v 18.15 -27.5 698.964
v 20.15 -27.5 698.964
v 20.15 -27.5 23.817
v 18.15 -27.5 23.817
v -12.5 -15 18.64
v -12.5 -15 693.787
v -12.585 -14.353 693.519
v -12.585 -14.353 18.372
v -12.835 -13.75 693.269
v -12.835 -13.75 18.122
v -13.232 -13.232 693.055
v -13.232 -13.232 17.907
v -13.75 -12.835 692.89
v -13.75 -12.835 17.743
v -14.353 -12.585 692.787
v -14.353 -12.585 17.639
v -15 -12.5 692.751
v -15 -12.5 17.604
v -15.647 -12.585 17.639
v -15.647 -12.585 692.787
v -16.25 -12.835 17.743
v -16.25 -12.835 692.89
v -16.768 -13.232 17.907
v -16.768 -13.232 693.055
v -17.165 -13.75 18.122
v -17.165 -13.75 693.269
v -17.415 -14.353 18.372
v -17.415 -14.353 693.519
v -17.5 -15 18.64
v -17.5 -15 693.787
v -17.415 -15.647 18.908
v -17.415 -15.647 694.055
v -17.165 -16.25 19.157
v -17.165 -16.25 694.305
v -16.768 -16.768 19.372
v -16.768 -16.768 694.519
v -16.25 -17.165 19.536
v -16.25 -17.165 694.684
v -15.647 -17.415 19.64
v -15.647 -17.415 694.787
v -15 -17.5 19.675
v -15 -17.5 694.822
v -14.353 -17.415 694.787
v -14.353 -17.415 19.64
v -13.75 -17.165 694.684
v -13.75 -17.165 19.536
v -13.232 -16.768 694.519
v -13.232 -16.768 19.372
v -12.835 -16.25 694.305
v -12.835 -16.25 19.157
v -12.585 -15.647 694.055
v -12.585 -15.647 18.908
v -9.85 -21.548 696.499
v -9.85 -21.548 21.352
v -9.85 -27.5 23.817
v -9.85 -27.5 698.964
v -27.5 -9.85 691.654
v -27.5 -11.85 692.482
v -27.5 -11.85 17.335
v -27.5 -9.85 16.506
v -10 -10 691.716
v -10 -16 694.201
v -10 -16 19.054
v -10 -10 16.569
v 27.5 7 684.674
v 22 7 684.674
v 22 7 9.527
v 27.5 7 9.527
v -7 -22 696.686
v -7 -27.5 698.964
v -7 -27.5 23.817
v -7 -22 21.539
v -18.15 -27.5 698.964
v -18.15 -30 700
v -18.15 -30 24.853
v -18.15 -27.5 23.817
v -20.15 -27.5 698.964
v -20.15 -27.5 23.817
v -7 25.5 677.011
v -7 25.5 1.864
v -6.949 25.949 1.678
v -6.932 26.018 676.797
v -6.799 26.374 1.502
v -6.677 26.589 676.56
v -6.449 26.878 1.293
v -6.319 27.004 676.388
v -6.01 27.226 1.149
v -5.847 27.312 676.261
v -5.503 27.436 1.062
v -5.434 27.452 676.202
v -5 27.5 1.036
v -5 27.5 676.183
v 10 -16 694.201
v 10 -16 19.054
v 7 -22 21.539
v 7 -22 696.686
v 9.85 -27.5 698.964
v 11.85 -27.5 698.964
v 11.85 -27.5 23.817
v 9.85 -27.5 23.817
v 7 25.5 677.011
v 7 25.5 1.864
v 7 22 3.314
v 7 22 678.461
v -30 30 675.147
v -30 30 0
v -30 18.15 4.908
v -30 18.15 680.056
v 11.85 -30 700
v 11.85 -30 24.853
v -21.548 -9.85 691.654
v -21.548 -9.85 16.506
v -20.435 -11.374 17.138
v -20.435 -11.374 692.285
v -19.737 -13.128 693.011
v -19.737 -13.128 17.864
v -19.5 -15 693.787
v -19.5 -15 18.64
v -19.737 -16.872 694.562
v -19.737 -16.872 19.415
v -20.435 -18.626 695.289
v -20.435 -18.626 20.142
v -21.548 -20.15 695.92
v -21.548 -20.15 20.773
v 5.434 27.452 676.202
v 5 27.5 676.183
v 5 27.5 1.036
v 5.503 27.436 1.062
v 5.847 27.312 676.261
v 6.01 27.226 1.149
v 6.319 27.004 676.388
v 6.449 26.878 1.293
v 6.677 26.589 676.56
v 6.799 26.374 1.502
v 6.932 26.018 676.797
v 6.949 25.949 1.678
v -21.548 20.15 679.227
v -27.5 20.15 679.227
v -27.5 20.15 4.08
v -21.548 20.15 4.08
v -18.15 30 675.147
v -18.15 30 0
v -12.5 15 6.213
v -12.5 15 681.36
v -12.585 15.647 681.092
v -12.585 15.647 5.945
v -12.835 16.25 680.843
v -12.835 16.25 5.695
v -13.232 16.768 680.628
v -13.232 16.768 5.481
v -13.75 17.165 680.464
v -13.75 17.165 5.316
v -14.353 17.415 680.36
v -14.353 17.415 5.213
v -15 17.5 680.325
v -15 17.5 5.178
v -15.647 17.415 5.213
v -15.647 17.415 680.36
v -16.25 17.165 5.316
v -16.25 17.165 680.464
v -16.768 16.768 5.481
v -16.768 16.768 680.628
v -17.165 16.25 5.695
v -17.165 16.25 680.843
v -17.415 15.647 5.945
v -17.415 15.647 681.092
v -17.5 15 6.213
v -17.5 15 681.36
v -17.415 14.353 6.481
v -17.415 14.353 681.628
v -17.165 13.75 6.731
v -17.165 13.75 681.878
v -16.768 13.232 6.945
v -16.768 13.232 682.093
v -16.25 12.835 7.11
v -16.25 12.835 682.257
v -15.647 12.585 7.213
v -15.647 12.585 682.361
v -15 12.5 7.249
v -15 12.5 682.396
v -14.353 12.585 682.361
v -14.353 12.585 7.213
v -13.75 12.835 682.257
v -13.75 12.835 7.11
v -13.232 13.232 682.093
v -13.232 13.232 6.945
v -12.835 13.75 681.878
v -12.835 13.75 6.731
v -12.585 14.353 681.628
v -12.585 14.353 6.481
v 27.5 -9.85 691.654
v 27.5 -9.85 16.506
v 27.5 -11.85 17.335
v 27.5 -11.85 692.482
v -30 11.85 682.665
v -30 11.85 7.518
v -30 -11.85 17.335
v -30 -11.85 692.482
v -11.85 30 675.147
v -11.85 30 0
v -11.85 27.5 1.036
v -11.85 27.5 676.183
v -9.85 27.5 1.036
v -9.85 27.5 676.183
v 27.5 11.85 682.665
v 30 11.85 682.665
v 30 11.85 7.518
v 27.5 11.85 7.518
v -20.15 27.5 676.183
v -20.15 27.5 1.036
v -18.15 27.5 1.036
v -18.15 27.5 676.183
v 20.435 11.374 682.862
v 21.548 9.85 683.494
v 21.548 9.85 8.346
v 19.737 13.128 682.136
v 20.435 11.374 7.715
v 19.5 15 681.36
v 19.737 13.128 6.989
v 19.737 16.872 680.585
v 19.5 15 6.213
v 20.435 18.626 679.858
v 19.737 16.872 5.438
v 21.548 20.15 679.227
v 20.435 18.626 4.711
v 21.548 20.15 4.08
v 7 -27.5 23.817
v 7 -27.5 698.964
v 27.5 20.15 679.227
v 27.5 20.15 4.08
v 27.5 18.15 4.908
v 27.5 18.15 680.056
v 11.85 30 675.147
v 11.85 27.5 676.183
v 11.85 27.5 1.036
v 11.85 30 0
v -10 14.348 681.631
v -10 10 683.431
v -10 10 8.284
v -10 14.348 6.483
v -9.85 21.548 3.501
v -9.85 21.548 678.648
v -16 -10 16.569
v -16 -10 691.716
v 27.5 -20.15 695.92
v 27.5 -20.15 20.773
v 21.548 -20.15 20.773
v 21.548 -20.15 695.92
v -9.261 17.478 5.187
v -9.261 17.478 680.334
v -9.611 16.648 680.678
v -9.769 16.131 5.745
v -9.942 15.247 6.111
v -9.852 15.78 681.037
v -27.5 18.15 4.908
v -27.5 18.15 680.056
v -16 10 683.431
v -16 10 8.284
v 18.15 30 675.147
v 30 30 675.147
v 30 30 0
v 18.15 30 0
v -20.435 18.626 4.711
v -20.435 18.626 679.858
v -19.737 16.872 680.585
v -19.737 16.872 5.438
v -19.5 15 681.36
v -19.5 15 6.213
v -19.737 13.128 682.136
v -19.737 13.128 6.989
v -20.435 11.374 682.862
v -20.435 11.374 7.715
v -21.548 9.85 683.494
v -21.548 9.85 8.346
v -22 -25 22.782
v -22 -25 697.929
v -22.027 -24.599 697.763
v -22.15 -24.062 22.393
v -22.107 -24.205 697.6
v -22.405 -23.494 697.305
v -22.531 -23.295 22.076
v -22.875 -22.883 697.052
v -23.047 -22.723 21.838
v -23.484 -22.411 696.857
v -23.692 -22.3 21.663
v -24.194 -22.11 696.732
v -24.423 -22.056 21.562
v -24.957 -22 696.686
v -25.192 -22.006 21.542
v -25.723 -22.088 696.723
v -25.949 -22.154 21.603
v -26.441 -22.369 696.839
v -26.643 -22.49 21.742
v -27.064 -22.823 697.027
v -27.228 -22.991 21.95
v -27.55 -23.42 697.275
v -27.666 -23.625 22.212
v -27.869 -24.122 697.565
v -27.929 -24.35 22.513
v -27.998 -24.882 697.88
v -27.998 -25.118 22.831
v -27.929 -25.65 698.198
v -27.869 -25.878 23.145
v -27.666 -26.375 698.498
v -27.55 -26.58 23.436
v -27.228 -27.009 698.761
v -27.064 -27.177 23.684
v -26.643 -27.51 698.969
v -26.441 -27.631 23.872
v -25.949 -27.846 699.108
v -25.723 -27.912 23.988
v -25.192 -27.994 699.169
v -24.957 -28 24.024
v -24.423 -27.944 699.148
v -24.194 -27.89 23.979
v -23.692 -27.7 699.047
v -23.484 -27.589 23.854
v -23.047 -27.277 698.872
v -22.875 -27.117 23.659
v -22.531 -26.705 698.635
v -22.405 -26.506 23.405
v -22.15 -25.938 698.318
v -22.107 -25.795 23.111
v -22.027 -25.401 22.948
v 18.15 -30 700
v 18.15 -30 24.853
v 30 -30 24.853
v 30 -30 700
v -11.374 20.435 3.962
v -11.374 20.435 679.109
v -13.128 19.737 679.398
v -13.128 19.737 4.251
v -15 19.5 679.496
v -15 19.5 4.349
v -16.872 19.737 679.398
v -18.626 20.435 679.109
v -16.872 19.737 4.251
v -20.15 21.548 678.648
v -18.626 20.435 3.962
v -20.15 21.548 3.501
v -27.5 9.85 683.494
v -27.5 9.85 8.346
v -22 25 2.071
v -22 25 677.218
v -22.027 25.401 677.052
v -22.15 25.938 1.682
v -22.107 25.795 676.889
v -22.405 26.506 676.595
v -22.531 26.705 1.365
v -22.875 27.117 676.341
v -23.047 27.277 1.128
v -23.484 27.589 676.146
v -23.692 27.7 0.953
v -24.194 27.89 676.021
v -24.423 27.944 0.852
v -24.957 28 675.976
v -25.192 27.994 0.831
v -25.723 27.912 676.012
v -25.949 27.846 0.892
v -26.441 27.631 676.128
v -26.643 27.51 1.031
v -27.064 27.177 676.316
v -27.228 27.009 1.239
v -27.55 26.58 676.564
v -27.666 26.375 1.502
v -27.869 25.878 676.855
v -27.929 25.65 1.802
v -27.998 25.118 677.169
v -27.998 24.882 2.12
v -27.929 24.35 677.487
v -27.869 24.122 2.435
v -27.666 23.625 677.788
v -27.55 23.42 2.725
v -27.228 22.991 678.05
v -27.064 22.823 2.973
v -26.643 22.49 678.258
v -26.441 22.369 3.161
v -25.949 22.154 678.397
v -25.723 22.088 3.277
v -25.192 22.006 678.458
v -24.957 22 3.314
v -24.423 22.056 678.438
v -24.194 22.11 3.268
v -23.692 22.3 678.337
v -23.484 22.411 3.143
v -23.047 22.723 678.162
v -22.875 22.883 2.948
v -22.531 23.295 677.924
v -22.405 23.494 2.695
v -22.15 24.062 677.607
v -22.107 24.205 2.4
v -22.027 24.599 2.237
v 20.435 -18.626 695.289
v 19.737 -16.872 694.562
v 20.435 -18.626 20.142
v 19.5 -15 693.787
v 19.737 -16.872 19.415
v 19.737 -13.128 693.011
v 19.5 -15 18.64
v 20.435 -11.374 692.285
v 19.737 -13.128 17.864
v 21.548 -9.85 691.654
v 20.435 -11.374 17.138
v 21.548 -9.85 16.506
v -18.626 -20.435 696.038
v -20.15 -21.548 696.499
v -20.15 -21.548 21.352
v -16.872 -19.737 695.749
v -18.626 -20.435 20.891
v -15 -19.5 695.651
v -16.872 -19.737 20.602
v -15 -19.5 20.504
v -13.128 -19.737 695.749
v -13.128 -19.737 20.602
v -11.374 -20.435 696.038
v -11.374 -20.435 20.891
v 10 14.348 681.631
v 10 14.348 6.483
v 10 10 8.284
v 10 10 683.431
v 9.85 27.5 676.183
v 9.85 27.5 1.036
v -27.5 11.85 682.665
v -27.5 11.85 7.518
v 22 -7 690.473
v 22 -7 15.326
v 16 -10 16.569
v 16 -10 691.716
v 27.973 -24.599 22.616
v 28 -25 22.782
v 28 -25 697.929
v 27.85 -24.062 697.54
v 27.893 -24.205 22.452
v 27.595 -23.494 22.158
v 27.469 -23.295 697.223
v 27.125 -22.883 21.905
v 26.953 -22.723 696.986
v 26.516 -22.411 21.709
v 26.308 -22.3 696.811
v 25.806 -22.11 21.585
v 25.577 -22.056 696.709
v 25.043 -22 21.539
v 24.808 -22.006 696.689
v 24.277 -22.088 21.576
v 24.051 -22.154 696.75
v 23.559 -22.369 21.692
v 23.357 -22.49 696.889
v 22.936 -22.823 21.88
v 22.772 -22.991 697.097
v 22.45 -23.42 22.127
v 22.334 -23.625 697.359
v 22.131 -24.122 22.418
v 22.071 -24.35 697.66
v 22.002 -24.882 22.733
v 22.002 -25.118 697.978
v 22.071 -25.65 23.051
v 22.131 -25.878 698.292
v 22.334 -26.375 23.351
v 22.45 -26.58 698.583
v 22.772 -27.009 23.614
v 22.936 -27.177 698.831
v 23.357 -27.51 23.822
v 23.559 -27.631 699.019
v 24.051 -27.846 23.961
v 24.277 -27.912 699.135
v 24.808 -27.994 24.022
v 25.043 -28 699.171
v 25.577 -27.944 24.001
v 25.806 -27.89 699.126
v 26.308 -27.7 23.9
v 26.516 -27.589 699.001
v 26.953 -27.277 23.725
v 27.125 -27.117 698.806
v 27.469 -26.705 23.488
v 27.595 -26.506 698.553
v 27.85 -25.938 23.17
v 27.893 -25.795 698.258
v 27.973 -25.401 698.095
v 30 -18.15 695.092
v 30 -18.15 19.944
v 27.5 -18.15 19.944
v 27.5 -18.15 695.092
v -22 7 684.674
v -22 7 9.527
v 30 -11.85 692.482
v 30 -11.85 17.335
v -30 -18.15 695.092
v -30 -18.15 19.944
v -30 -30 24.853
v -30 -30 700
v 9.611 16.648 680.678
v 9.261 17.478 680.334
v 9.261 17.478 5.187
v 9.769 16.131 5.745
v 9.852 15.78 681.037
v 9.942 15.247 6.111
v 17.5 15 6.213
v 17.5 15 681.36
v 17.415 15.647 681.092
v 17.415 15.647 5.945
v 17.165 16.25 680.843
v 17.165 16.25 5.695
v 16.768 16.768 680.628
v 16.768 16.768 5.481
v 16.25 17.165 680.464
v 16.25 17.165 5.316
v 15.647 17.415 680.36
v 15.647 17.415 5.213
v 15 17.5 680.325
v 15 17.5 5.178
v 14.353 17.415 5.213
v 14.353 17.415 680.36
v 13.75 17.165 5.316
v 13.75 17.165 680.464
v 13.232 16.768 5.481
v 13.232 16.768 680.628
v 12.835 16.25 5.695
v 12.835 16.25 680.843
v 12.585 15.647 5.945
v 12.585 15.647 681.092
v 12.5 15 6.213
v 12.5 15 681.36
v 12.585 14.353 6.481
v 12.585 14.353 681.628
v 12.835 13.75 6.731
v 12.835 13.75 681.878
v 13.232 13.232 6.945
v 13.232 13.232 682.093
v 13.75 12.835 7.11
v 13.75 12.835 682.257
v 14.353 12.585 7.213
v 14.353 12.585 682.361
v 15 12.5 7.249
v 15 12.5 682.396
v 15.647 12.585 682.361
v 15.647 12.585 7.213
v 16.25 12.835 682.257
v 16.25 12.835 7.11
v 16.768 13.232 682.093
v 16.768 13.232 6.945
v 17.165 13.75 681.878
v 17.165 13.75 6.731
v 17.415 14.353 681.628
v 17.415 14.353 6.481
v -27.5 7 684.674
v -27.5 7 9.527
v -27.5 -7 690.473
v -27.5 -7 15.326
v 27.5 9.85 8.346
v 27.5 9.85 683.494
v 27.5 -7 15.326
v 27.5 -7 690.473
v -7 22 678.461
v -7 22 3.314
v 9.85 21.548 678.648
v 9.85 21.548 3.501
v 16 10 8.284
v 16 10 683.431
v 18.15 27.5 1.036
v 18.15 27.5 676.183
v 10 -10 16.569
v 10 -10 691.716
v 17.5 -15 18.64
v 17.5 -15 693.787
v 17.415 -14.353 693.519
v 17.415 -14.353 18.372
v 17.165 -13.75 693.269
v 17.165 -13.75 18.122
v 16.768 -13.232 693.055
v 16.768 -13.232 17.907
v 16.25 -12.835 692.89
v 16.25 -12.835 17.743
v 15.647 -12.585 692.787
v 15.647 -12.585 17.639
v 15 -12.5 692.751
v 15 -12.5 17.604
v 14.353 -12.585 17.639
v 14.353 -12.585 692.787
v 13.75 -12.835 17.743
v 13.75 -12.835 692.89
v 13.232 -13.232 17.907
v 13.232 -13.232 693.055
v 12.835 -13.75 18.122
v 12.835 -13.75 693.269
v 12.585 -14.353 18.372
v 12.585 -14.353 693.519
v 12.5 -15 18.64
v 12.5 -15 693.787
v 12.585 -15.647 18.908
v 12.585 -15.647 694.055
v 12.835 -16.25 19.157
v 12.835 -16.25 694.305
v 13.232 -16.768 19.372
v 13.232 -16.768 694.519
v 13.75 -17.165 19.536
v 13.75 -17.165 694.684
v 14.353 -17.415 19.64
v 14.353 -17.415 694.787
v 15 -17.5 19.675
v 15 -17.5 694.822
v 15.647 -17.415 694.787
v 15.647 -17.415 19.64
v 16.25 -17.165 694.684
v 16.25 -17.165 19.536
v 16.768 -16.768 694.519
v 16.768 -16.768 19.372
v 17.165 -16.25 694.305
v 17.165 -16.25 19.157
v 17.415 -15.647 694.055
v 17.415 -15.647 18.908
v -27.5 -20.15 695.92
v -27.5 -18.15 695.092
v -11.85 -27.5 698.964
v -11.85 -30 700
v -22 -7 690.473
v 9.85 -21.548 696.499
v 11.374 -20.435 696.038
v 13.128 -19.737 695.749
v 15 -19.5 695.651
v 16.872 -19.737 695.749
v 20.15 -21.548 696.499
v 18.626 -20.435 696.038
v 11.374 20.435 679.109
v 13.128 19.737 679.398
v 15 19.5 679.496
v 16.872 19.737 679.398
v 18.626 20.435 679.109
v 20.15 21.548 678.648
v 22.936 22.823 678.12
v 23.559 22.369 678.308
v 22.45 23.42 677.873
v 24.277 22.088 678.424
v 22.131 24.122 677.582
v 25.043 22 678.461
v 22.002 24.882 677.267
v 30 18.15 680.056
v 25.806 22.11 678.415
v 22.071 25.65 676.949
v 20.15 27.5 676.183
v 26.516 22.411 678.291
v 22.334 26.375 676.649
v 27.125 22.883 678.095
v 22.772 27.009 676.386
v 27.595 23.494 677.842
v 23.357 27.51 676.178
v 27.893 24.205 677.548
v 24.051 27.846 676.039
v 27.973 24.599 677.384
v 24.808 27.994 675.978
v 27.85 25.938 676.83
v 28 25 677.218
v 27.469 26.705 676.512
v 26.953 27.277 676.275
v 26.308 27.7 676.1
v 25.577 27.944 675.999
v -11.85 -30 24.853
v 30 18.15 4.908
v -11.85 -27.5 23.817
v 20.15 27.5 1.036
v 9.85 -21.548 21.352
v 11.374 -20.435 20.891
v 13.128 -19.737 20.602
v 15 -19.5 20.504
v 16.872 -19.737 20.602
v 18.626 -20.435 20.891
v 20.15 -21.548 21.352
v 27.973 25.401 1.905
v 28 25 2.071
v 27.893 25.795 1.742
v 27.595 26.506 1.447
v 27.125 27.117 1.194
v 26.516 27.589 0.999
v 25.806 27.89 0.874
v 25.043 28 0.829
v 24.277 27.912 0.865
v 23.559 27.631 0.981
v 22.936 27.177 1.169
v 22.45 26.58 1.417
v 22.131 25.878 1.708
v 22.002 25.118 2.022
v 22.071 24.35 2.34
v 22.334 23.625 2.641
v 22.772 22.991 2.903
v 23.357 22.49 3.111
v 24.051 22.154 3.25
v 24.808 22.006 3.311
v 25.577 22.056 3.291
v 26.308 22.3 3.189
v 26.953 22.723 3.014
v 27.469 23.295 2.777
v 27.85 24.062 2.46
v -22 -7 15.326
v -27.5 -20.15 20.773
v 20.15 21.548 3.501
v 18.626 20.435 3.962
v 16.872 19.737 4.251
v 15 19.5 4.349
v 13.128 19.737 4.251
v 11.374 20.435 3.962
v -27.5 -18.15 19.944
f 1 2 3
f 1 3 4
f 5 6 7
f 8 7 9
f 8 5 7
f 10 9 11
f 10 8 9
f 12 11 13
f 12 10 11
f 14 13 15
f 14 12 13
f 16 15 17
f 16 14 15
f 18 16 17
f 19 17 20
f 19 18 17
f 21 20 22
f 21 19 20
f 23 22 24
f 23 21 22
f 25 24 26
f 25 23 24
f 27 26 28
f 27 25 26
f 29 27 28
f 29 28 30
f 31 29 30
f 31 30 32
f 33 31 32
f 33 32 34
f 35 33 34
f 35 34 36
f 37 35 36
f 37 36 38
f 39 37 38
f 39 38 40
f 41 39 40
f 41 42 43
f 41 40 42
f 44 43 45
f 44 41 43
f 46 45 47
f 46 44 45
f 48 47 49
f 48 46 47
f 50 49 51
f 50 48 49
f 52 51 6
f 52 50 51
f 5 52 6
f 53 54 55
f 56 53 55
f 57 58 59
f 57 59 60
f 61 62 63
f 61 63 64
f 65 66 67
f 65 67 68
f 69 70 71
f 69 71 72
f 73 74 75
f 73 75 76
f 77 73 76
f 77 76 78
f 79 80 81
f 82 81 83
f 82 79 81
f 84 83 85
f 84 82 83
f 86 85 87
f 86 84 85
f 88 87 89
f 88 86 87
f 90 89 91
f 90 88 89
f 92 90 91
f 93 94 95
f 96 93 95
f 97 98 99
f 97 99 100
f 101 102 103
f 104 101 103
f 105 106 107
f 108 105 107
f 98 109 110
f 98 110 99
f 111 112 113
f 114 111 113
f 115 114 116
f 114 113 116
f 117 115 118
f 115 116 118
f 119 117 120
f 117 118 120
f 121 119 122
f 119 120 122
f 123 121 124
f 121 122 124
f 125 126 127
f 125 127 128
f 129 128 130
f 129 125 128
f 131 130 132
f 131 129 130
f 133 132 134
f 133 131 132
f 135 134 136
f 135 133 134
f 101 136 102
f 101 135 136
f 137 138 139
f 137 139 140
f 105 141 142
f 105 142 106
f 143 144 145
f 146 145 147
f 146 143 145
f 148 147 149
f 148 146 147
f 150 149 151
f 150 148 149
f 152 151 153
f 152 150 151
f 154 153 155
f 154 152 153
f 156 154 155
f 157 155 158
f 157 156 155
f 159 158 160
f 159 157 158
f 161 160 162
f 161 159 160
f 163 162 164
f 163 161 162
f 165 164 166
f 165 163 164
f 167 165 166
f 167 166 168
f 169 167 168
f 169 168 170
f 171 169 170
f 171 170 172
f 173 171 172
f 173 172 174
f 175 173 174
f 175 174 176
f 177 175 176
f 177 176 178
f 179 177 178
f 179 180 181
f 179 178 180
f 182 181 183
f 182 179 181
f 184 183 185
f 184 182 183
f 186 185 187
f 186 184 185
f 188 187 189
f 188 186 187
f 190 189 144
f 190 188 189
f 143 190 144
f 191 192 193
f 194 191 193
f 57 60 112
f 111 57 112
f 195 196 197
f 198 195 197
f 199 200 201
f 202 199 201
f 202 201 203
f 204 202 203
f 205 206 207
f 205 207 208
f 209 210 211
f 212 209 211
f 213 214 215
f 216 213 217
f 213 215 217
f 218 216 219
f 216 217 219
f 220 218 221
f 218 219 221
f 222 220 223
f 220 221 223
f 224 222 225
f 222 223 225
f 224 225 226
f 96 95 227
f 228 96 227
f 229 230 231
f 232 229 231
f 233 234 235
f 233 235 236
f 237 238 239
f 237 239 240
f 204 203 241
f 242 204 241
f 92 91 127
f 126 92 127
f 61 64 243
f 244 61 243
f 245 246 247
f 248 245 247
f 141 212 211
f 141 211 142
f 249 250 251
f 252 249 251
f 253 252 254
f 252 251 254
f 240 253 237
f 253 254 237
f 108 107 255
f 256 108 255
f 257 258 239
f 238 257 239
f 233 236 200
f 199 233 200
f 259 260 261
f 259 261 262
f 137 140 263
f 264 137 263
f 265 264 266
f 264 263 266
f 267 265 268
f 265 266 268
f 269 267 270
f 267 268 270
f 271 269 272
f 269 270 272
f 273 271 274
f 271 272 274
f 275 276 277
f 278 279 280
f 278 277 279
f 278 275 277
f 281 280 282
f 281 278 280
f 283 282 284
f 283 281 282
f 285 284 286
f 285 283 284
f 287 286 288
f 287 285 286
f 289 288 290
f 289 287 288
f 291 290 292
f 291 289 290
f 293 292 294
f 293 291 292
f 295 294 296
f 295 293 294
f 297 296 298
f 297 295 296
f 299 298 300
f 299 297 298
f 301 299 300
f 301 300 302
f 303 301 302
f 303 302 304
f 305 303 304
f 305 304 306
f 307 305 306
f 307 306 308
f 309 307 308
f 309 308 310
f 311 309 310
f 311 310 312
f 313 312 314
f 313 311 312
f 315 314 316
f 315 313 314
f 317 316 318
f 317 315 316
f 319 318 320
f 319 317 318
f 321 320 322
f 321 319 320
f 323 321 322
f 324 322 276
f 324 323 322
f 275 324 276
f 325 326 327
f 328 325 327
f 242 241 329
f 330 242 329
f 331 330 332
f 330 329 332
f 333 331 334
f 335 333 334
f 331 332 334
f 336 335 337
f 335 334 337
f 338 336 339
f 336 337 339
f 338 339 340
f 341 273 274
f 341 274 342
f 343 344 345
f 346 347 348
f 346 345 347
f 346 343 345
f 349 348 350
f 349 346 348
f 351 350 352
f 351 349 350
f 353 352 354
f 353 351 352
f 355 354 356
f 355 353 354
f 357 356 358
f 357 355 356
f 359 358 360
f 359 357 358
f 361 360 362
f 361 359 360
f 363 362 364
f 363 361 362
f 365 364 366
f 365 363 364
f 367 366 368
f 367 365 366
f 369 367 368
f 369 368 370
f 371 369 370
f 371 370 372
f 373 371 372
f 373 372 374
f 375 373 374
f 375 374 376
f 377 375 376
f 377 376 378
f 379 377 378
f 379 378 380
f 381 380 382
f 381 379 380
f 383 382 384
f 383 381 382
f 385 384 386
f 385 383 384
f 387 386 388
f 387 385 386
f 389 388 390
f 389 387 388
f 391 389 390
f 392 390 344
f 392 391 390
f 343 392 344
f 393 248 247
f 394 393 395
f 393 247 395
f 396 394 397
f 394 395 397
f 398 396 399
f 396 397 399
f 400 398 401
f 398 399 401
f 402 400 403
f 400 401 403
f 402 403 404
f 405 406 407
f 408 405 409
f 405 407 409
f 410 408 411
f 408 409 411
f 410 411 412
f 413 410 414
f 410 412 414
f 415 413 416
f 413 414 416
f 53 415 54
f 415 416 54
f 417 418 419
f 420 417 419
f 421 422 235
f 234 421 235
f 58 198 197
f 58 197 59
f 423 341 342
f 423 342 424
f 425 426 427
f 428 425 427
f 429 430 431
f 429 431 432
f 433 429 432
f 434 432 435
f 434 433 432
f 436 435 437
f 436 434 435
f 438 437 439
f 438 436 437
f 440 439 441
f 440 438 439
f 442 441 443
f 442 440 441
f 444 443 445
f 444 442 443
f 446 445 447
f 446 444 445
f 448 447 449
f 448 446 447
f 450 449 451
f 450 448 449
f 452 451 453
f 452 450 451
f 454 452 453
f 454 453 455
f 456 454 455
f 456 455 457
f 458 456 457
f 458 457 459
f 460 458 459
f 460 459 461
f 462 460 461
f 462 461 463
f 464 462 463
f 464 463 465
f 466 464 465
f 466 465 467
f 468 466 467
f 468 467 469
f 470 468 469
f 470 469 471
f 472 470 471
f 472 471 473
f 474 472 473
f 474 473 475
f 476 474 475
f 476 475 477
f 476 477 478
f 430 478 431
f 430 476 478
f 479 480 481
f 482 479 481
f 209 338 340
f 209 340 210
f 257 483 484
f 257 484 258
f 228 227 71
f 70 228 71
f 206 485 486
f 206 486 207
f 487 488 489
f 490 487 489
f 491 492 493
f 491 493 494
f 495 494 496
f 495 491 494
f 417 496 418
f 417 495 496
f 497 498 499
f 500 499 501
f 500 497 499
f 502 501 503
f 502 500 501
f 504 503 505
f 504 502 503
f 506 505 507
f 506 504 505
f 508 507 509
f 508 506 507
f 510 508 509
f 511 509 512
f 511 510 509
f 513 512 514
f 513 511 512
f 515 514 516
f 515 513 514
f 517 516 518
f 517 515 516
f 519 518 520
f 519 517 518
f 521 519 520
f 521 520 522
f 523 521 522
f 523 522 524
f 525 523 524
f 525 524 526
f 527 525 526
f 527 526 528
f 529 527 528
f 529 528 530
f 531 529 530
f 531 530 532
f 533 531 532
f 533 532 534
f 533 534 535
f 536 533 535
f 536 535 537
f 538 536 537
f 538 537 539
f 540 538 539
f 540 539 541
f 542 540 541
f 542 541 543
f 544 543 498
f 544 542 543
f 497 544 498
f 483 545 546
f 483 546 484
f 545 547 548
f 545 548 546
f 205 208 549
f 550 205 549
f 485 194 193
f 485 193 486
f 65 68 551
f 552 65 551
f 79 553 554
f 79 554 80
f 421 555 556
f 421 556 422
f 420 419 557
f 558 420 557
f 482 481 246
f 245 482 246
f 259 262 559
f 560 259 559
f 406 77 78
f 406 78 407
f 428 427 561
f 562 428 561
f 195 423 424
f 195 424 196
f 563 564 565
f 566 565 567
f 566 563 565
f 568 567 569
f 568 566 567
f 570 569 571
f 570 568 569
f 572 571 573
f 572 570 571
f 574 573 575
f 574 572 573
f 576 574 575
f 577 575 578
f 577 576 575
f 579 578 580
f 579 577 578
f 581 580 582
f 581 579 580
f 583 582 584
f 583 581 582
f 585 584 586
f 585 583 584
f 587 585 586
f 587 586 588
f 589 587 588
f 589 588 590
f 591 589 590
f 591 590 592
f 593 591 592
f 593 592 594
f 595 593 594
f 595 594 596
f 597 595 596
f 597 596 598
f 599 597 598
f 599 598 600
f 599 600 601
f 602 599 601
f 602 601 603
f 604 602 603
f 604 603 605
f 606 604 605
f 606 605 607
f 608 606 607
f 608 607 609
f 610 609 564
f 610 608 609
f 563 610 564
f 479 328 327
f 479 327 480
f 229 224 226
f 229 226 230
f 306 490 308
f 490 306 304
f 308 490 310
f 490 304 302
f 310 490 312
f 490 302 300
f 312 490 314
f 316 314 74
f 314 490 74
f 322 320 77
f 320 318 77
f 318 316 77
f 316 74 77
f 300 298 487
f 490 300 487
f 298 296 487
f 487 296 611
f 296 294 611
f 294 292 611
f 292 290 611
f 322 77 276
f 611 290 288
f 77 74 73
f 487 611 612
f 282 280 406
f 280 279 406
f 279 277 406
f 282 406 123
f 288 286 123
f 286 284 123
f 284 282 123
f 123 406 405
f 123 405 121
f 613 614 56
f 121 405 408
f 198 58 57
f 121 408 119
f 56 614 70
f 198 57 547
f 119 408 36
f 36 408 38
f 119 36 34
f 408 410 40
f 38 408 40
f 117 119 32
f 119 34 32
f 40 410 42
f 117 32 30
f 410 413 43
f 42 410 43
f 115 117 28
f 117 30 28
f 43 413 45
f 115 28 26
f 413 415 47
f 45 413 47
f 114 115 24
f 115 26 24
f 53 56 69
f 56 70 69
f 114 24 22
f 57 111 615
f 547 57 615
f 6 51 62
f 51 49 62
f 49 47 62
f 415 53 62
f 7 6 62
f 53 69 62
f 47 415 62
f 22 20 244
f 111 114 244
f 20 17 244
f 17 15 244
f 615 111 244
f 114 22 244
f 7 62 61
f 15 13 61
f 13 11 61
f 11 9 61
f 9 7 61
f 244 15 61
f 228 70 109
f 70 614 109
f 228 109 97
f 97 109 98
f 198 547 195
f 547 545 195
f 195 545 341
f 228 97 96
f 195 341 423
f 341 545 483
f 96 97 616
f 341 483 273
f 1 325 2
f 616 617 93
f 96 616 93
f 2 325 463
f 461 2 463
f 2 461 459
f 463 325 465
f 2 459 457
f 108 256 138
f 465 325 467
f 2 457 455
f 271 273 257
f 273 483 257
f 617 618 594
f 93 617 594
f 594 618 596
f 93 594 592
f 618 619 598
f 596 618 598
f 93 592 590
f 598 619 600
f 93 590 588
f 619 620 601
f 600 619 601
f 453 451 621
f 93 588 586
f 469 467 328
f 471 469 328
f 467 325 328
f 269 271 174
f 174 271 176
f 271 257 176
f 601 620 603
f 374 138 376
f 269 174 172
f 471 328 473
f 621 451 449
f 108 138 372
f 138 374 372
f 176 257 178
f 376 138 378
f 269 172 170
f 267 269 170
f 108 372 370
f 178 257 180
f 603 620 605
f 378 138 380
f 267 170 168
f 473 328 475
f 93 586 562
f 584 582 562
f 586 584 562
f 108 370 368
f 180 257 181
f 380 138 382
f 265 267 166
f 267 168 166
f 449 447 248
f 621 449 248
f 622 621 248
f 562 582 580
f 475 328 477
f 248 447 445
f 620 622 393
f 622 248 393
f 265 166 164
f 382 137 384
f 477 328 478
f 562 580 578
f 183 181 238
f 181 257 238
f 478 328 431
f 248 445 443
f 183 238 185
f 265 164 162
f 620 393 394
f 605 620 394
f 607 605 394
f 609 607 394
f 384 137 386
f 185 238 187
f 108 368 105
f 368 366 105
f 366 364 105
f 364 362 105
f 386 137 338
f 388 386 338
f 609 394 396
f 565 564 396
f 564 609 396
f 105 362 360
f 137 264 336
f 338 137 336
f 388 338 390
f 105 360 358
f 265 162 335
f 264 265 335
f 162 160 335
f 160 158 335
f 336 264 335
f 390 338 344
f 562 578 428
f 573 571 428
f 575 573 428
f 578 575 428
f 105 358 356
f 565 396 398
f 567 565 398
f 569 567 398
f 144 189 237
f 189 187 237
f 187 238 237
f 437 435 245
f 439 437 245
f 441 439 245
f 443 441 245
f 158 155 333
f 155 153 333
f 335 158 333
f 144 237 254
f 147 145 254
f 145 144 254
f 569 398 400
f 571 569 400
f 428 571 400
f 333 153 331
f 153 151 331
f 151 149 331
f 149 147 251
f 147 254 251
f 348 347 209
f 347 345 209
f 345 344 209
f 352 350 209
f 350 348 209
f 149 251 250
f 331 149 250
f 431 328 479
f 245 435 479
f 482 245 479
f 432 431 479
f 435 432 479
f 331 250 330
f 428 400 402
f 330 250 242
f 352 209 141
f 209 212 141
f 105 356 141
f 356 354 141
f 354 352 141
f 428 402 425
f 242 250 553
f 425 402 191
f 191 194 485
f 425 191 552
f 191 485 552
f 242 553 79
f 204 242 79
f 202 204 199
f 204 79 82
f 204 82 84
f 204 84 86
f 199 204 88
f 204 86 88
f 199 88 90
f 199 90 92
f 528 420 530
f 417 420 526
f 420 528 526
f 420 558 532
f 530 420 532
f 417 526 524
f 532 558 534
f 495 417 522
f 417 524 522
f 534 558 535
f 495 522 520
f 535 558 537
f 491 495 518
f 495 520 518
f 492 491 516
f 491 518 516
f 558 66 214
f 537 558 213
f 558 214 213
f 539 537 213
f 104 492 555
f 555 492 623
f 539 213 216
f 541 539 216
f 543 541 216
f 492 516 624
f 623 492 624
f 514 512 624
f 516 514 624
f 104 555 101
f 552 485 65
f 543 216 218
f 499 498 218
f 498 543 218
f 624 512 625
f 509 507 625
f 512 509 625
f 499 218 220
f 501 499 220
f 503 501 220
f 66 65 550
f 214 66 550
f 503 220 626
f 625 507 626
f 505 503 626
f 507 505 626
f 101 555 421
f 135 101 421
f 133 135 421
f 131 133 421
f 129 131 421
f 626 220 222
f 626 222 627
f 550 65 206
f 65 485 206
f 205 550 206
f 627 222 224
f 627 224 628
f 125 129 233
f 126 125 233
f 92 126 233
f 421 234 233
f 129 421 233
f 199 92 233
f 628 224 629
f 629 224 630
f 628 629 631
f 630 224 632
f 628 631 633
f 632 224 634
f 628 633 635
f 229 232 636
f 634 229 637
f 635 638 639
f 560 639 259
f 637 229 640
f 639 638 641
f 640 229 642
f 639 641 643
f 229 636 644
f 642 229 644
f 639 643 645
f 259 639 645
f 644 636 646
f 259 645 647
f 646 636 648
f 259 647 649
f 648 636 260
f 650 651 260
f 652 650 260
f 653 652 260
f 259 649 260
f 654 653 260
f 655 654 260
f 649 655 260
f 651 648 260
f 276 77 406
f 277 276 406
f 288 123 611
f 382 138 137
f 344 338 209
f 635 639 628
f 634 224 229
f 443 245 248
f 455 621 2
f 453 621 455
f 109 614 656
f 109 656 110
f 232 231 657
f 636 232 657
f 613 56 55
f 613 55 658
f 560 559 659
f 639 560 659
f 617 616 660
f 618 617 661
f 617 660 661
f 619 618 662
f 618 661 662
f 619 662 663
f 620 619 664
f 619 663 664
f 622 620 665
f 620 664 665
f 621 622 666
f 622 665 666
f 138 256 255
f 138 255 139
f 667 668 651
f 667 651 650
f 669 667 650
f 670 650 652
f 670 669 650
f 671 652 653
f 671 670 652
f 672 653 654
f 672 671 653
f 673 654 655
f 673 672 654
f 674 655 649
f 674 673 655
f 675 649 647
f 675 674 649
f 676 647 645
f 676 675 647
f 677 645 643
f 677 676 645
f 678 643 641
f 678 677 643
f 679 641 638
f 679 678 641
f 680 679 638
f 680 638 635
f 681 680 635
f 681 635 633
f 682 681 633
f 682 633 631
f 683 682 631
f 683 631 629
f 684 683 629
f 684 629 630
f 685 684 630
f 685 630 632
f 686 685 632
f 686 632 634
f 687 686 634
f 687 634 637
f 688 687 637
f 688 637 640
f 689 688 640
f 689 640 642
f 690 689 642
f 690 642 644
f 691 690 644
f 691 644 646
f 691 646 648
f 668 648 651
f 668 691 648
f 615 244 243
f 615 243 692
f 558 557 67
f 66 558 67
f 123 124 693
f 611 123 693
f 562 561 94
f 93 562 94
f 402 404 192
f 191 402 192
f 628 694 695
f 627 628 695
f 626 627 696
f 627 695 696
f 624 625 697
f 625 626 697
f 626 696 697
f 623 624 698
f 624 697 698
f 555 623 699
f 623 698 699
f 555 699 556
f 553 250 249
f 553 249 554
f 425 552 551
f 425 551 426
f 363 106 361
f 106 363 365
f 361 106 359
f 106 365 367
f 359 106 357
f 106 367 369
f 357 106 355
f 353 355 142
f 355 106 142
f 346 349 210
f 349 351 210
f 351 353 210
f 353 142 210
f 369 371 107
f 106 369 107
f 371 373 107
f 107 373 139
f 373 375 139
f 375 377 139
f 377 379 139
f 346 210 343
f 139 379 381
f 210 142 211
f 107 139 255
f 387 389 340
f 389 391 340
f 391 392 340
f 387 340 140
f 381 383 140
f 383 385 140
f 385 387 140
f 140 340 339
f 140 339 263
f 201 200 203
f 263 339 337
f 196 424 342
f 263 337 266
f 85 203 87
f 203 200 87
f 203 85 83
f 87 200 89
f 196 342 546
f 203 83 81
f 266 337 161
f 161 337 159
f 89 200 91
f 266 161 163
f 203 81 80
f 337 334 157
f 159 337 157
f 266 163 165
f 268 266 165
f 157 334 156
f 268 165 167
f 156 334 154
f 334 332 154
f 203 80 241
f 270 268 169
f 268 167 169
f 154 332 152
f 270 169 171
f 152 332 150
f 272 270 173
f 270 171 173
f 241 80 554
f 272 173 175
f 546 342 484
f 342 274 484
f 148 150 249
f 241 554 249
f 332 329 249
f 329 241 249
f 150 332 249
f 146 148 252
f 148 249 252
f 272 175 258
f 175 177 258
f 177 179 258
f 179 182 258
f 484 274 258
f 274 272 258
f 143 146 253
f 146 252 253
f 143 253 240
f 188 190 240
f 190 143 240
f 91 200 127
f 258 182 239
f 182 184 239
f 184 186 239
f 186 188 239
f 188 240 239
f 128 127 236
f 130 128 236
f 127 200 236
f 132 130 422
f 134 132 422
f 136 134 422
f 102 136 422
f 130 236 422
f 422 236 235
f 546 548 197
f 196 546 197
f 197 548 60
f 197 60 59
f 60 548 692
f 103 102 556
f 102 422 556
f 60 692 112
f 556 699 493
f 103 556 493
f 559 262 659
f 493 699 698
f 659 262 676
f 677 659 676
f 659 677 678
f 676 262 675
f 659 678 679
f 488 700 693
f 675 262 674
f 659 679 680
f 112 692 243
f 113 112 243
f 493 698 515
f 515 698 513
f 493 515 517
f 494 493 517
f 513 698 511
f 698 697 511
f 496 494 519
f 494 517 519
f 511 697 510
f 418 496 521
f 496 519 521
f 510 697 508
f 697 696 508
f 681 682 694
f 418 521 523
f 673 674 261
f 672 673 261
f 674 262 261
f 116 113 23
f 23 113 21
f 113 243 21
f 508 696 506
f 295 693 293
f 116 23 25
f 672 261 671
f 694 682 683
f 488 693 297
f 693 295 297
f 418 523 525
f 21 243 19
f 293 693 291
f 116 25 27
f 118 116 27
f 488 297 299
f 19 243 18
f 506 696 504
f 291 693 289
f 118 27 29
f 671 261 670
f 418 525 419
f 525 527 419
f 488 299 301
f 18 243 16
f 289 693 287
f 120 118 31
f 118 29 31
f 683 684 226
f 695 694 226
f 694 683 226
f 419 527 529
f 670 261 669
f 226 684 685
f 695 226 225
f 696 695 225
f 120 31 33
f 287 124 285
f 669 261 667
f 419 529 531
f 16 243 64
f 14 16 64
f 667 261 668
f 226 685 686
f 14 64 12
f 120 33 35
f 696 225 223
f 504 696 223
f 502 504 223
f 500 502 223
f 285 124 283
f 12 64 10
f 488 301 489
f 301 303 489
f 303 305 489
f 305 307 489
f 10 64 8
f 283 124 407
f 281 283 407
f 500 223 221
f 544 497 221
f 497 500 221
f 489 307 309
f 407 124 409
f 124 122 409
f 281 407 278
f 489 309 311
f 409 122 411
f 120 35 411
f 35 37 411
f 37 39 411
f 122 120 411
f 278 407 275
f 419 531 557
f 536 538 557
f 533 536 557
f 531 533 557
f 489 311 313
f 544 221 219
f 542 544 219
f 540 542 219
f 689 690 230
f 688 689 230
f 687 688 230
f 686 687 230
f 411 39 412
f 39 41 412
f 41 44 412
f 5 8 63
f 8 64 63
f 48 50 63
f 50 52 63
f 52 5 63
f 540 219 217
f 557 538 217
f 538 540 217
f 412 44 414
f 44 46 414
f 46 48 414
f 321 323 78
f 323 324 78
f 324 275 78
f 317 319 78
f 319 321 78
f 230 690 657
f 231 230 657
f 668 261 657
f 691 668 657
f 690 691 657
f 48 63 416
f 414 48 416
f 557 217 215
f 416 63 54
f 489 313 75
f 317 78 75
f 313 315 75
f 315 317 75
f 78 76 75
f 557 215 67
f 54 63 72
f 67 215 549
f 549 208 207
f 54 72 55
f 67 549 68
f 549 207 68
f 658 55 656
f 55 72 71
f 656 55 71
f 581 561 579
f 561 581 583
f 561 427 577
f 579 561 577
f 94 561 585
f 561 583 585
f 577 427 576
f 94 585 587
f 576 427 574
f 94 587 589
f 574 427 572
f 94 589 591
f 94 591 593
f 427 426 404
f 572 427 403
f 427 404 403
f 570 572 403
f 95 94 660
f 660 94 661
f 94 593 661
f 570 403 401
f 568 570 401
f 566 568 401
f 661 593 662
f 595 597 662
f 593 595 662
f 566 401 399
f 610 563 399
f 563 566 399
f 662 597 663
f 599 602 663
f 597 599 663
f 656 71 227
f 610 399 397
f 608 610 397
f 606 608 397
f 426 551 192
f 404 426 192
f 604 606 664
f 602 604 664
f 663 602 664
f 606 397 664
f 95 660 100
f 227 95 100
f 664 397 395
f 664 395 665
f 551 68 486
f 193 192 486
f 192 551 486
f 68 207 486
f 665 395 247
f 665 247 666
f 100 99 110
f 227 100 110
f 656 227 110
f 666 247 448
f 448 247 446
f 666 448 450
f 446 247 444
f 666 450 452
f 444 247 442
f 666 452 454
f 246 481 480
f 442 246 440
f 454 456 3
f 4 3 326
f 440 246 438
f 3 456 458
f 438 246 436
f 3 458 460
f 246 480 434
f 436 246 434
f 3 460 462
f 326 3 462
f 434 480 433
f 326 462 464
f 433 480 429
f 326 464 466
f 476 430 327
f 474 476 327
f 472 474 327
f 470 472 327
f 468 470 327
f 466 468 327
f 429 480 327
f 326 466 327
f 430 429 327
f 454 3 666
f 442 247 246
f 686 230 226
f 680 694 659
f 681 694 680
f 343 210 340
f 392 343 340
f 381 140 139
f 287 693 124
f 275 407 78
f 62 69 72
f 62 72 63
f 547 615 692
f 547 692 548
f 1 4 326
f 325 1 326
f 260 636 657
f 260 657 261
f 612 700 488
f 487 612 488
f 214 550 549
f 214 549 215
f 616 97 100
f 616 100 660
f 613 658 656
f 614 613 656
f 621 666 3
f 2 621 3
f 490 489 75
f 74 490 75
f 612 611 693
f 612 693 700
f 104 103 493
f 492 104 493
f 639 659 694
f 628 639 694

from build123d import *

# Parameters (mm, degrees)
F0_R          = 3
F0_R_2        = 2.5
F1_DEPTH      = 700
F2_R          = 2
F3_R          = 7
F6_DEPTH      = 30
F6_DEPTH_BACK = 30


# Not quite as in the source:
# - a feature names something its author has since deleted; it is built from what else it names


with BuildPart() as f1:
    # F0 (on Top) → F1 (new body)
    with BuildSketch(Plane.XY):
        with BuildLine():
            Line((18.15, -30), (30, -30))
            Line((30, -30), (30, -18.15))
            Line((30, -18.15), (27.5, -18.15))
            Line((27.5, -18.15), (27.5, -20.15))
            Line((27.5, -20.15), (21.5477069044, -20.15))
            ThreePointArc((21.5477069044, -20.15), (19.5, -15), (21.5477069044, -9.85))
            Line((21.5477069044, -9.85), (27.5, -9.85))
            Line((27.5, -9.85), (27.5, -11.85))
            Line((27.5, -11.85), (30, -11.85))
            Line((30, -11.85), (30, 11.85))
            Line((30, 11.85), (27.5, 11.85))
            Line((27.5, 11.85), (27.5, 9.85))
            Line((27.5, 9.85), (21.5477069044, 9.85))
            ThreePointArc((21.5477069044, 9.85), (19.5, 15), (21.5477069044, 20.15))
            Line((21.5477069044, 20.15), (27.5, 20.15))
            Line((27.5, 20.15), (27.5, 18.15))
            Line((27.5, 18.15), (30, 18.15))
            Line((30, 18.15), (30, 30))
            Line((30, 30), (18.15, 30))
            Line((18.15, 30), (18.15, 27.5))
            Line((18.15, 27.5), (20.15, 27.5))
            Line((20.15, 27.5), (20.15, 21.5477069044))
            ThreePointArc((20.15, 21.5477069044), (15, 19.5), (9.85, 21.5477069044))
            Line((9.85, 21.5477069044), (9.85, 27.5))
            Line((9.85, 27.5), (11.85, 27.5))
            Line((11.85, 27.5), (11.85, 30))
            Line((11.85, 30), (-11.85, 30))
            Line((-11.85, 30), (-11.85, 27.5))
            Line((-11.85, 27.5), (-9.85, 27.5))
            Line((-9.85, 27.5), (-9.85, 21.5477069044))
            ThreePointArc((-9.85, 21.5477069044), (-15, 19.5), (-20.15, 21.5477069044))
            Line((-20.15, 21.5477069044), (-20.15, 27.5))
            Line((-20.15, 27.5), (-18.15, 27.5))
            Line((-18.15, 27.5), (-18.15, 30))
            Line((-18.15, 30), (-30, 30))
            Line((-30, 30), (-30, 18.15))
            Line((-30, 18.15), (-27.5, 18.15))
            Line((-27.5, 18.15), (-27.5, 20.15))
            Line((-27.5, 20.15), (-21.5477069044, 20.15))
            ThreePointArc((-21.5477069044, 20.15), (-19.5, 15), (-21.5477069044, 9.85))
            Line((-21.5477069044, 9.85), (-27.5, 9.85))
            Line((-27.5, 9.85), (-27.5, 11.85))
            Line((-27.5, 11.85), (-30, 11.85))
            Line((-30, 11.85), (-30, -11.85))
            Line((-30, -11.85), (-27.5, -11.85))
            Line((-27.5, -11.85), (-27.5, -9.85))
            Line((-27.5, -9.85), (-21.5477069044, -9.85))
            ThreePointArc((-21.5477069044, -9.85), (-19.5, -15), (-21.5477069044, -20.15))
            Line((-21.5477069044, -20.15), (-27.5, -20.15))
            Line((-27.5, -20.15), (-27.5, -18.15))
            Line((-27.5, -18.15), (-30, -18.15))
            Line((-30, -18.15), (-30, -30))
            Line((-30, -30), (-18.15, -30))
            Line((-18.15, -30), (-18.15, -27.5))
            Line((-18.15, -27.5), (-20.15, -27.5))
            Line((-20.15, -27.5), (-20.15, -21.5477069044))
            ThreePointArc((-20.15, -21.5477069044), (-15, -19.5), (-9.85, -21.5477069044))
            Line((-9.85, -21.5477069044), (-9.85, -27.5))
            Line((-9.85, -27.5), (-11.85, -27.5))
            Line((-11.85, -27.5), (-11.85, -30))
            Line((-11.85, -30), (11.85, -30))
            Line((11.85, -30), (11.85, -27.5))
            Line((11.85, -27.5), (9.85, -27.5))
            Line((9.85, -27.5), (9.85, -21.5477069044))
            ThreePointArc((9.85, -21.5477069044), (15, -19.5), (20.15, -21.5477069044))
            Line((20.15, -21.5477069044), (20.15, -27.5))
            Line((20.15, -27.5), (18.15, -27.5))
            Line((18.15, -27.5), (18.15, -30))
        make_face()
        with Locations((-25, -25)):
            Circle(F0_R, mode=Mode.SUBTRACT)
        with Locations((-15, -15)):
            Circle(F0_R_2, mode=Mode.SUBTRACT)
        with Locations((25, -25)):
            Circle(F0_R, mode=Mode.SUBTRACT)
        with Locations((15, -15)):
            Circle(F0_R_2, mode=Mode.SUBTRACT)
        with Locations((-25, 25)):
            Circle(F0_R, mode=Mode.SUBTRACT)
        with Locations((-15, 15)):
            Circle(F0_R_2, mode=Mode.SUBTRACT)
        Polygon((-7, 22), (-7, 27.5), (0, 27.5), (7, 27.5), (7, 22), (10, 16), (10, 10), (16, 10), (22, 7), (27.5, 7), (27.5, 0), (27.5, -7), (22, -7), (16, -10), (10, -10), (10, -16), (7, -22), (7, -27.5), (0, -27.5), (-7, -27.5), (-7, -22), (-10, -16), (-10, -10), (-16, -10), (-22, -7), (-27.5, -7), (-27.5, 0), (-27.5, 7), (-22, 7), (-16, 10), (-10, 10), (-10, 16), align=None, mode=Mode.SUBTRACT)
        with Locations((15, 15)):
            Circle(F0_R_2, mode=Mode.SUBTRACT)
        with Locations((25, 25)):
            Circle(F0_R, mode=Mode.SUBTRACT)
    extrude(amount=F1_DEPTH)

    # F2
    f2_edges = [f1.edges().sort_by_distance(p)[0] for p in [
        (-7, 27.5, 350),
        (7, 27.5, 350),
    ]]
    fillet(f2_edges, radius=F2_R)

    # F3
    f3_edges = [f1.edges().sort_by_distance(p)[0] for p in [
        (-10, 16, 350),
        (10, 16, 350),
    ]]
    fillet(f3_edges, radius=F3_R)

    # F5 (on Right) → F6 (cut, two sides)
    with BuildSketch(Plane.YZ) as f6_sk:
        Polygon((30, 0), (-73.1568263622, 42.7289565306), (-138.818297568, -115.7918577799), (-35.6614712058, -158.5208143105), align=None)
        Polygon((194.2250905883, 866.574744896), (61.7300701058, 921.4559793268), (-30, 700), (102.4950204826, 645.1187655692), align=None)
    extrude(amount=F6_DEPTH, mode=Mode.SUBTRACT)
    extrude(f6_sk.sketch, amount=-F6_DEPTH_BACK, mode=Mode.SUBTRACT)


solid = f1.part
